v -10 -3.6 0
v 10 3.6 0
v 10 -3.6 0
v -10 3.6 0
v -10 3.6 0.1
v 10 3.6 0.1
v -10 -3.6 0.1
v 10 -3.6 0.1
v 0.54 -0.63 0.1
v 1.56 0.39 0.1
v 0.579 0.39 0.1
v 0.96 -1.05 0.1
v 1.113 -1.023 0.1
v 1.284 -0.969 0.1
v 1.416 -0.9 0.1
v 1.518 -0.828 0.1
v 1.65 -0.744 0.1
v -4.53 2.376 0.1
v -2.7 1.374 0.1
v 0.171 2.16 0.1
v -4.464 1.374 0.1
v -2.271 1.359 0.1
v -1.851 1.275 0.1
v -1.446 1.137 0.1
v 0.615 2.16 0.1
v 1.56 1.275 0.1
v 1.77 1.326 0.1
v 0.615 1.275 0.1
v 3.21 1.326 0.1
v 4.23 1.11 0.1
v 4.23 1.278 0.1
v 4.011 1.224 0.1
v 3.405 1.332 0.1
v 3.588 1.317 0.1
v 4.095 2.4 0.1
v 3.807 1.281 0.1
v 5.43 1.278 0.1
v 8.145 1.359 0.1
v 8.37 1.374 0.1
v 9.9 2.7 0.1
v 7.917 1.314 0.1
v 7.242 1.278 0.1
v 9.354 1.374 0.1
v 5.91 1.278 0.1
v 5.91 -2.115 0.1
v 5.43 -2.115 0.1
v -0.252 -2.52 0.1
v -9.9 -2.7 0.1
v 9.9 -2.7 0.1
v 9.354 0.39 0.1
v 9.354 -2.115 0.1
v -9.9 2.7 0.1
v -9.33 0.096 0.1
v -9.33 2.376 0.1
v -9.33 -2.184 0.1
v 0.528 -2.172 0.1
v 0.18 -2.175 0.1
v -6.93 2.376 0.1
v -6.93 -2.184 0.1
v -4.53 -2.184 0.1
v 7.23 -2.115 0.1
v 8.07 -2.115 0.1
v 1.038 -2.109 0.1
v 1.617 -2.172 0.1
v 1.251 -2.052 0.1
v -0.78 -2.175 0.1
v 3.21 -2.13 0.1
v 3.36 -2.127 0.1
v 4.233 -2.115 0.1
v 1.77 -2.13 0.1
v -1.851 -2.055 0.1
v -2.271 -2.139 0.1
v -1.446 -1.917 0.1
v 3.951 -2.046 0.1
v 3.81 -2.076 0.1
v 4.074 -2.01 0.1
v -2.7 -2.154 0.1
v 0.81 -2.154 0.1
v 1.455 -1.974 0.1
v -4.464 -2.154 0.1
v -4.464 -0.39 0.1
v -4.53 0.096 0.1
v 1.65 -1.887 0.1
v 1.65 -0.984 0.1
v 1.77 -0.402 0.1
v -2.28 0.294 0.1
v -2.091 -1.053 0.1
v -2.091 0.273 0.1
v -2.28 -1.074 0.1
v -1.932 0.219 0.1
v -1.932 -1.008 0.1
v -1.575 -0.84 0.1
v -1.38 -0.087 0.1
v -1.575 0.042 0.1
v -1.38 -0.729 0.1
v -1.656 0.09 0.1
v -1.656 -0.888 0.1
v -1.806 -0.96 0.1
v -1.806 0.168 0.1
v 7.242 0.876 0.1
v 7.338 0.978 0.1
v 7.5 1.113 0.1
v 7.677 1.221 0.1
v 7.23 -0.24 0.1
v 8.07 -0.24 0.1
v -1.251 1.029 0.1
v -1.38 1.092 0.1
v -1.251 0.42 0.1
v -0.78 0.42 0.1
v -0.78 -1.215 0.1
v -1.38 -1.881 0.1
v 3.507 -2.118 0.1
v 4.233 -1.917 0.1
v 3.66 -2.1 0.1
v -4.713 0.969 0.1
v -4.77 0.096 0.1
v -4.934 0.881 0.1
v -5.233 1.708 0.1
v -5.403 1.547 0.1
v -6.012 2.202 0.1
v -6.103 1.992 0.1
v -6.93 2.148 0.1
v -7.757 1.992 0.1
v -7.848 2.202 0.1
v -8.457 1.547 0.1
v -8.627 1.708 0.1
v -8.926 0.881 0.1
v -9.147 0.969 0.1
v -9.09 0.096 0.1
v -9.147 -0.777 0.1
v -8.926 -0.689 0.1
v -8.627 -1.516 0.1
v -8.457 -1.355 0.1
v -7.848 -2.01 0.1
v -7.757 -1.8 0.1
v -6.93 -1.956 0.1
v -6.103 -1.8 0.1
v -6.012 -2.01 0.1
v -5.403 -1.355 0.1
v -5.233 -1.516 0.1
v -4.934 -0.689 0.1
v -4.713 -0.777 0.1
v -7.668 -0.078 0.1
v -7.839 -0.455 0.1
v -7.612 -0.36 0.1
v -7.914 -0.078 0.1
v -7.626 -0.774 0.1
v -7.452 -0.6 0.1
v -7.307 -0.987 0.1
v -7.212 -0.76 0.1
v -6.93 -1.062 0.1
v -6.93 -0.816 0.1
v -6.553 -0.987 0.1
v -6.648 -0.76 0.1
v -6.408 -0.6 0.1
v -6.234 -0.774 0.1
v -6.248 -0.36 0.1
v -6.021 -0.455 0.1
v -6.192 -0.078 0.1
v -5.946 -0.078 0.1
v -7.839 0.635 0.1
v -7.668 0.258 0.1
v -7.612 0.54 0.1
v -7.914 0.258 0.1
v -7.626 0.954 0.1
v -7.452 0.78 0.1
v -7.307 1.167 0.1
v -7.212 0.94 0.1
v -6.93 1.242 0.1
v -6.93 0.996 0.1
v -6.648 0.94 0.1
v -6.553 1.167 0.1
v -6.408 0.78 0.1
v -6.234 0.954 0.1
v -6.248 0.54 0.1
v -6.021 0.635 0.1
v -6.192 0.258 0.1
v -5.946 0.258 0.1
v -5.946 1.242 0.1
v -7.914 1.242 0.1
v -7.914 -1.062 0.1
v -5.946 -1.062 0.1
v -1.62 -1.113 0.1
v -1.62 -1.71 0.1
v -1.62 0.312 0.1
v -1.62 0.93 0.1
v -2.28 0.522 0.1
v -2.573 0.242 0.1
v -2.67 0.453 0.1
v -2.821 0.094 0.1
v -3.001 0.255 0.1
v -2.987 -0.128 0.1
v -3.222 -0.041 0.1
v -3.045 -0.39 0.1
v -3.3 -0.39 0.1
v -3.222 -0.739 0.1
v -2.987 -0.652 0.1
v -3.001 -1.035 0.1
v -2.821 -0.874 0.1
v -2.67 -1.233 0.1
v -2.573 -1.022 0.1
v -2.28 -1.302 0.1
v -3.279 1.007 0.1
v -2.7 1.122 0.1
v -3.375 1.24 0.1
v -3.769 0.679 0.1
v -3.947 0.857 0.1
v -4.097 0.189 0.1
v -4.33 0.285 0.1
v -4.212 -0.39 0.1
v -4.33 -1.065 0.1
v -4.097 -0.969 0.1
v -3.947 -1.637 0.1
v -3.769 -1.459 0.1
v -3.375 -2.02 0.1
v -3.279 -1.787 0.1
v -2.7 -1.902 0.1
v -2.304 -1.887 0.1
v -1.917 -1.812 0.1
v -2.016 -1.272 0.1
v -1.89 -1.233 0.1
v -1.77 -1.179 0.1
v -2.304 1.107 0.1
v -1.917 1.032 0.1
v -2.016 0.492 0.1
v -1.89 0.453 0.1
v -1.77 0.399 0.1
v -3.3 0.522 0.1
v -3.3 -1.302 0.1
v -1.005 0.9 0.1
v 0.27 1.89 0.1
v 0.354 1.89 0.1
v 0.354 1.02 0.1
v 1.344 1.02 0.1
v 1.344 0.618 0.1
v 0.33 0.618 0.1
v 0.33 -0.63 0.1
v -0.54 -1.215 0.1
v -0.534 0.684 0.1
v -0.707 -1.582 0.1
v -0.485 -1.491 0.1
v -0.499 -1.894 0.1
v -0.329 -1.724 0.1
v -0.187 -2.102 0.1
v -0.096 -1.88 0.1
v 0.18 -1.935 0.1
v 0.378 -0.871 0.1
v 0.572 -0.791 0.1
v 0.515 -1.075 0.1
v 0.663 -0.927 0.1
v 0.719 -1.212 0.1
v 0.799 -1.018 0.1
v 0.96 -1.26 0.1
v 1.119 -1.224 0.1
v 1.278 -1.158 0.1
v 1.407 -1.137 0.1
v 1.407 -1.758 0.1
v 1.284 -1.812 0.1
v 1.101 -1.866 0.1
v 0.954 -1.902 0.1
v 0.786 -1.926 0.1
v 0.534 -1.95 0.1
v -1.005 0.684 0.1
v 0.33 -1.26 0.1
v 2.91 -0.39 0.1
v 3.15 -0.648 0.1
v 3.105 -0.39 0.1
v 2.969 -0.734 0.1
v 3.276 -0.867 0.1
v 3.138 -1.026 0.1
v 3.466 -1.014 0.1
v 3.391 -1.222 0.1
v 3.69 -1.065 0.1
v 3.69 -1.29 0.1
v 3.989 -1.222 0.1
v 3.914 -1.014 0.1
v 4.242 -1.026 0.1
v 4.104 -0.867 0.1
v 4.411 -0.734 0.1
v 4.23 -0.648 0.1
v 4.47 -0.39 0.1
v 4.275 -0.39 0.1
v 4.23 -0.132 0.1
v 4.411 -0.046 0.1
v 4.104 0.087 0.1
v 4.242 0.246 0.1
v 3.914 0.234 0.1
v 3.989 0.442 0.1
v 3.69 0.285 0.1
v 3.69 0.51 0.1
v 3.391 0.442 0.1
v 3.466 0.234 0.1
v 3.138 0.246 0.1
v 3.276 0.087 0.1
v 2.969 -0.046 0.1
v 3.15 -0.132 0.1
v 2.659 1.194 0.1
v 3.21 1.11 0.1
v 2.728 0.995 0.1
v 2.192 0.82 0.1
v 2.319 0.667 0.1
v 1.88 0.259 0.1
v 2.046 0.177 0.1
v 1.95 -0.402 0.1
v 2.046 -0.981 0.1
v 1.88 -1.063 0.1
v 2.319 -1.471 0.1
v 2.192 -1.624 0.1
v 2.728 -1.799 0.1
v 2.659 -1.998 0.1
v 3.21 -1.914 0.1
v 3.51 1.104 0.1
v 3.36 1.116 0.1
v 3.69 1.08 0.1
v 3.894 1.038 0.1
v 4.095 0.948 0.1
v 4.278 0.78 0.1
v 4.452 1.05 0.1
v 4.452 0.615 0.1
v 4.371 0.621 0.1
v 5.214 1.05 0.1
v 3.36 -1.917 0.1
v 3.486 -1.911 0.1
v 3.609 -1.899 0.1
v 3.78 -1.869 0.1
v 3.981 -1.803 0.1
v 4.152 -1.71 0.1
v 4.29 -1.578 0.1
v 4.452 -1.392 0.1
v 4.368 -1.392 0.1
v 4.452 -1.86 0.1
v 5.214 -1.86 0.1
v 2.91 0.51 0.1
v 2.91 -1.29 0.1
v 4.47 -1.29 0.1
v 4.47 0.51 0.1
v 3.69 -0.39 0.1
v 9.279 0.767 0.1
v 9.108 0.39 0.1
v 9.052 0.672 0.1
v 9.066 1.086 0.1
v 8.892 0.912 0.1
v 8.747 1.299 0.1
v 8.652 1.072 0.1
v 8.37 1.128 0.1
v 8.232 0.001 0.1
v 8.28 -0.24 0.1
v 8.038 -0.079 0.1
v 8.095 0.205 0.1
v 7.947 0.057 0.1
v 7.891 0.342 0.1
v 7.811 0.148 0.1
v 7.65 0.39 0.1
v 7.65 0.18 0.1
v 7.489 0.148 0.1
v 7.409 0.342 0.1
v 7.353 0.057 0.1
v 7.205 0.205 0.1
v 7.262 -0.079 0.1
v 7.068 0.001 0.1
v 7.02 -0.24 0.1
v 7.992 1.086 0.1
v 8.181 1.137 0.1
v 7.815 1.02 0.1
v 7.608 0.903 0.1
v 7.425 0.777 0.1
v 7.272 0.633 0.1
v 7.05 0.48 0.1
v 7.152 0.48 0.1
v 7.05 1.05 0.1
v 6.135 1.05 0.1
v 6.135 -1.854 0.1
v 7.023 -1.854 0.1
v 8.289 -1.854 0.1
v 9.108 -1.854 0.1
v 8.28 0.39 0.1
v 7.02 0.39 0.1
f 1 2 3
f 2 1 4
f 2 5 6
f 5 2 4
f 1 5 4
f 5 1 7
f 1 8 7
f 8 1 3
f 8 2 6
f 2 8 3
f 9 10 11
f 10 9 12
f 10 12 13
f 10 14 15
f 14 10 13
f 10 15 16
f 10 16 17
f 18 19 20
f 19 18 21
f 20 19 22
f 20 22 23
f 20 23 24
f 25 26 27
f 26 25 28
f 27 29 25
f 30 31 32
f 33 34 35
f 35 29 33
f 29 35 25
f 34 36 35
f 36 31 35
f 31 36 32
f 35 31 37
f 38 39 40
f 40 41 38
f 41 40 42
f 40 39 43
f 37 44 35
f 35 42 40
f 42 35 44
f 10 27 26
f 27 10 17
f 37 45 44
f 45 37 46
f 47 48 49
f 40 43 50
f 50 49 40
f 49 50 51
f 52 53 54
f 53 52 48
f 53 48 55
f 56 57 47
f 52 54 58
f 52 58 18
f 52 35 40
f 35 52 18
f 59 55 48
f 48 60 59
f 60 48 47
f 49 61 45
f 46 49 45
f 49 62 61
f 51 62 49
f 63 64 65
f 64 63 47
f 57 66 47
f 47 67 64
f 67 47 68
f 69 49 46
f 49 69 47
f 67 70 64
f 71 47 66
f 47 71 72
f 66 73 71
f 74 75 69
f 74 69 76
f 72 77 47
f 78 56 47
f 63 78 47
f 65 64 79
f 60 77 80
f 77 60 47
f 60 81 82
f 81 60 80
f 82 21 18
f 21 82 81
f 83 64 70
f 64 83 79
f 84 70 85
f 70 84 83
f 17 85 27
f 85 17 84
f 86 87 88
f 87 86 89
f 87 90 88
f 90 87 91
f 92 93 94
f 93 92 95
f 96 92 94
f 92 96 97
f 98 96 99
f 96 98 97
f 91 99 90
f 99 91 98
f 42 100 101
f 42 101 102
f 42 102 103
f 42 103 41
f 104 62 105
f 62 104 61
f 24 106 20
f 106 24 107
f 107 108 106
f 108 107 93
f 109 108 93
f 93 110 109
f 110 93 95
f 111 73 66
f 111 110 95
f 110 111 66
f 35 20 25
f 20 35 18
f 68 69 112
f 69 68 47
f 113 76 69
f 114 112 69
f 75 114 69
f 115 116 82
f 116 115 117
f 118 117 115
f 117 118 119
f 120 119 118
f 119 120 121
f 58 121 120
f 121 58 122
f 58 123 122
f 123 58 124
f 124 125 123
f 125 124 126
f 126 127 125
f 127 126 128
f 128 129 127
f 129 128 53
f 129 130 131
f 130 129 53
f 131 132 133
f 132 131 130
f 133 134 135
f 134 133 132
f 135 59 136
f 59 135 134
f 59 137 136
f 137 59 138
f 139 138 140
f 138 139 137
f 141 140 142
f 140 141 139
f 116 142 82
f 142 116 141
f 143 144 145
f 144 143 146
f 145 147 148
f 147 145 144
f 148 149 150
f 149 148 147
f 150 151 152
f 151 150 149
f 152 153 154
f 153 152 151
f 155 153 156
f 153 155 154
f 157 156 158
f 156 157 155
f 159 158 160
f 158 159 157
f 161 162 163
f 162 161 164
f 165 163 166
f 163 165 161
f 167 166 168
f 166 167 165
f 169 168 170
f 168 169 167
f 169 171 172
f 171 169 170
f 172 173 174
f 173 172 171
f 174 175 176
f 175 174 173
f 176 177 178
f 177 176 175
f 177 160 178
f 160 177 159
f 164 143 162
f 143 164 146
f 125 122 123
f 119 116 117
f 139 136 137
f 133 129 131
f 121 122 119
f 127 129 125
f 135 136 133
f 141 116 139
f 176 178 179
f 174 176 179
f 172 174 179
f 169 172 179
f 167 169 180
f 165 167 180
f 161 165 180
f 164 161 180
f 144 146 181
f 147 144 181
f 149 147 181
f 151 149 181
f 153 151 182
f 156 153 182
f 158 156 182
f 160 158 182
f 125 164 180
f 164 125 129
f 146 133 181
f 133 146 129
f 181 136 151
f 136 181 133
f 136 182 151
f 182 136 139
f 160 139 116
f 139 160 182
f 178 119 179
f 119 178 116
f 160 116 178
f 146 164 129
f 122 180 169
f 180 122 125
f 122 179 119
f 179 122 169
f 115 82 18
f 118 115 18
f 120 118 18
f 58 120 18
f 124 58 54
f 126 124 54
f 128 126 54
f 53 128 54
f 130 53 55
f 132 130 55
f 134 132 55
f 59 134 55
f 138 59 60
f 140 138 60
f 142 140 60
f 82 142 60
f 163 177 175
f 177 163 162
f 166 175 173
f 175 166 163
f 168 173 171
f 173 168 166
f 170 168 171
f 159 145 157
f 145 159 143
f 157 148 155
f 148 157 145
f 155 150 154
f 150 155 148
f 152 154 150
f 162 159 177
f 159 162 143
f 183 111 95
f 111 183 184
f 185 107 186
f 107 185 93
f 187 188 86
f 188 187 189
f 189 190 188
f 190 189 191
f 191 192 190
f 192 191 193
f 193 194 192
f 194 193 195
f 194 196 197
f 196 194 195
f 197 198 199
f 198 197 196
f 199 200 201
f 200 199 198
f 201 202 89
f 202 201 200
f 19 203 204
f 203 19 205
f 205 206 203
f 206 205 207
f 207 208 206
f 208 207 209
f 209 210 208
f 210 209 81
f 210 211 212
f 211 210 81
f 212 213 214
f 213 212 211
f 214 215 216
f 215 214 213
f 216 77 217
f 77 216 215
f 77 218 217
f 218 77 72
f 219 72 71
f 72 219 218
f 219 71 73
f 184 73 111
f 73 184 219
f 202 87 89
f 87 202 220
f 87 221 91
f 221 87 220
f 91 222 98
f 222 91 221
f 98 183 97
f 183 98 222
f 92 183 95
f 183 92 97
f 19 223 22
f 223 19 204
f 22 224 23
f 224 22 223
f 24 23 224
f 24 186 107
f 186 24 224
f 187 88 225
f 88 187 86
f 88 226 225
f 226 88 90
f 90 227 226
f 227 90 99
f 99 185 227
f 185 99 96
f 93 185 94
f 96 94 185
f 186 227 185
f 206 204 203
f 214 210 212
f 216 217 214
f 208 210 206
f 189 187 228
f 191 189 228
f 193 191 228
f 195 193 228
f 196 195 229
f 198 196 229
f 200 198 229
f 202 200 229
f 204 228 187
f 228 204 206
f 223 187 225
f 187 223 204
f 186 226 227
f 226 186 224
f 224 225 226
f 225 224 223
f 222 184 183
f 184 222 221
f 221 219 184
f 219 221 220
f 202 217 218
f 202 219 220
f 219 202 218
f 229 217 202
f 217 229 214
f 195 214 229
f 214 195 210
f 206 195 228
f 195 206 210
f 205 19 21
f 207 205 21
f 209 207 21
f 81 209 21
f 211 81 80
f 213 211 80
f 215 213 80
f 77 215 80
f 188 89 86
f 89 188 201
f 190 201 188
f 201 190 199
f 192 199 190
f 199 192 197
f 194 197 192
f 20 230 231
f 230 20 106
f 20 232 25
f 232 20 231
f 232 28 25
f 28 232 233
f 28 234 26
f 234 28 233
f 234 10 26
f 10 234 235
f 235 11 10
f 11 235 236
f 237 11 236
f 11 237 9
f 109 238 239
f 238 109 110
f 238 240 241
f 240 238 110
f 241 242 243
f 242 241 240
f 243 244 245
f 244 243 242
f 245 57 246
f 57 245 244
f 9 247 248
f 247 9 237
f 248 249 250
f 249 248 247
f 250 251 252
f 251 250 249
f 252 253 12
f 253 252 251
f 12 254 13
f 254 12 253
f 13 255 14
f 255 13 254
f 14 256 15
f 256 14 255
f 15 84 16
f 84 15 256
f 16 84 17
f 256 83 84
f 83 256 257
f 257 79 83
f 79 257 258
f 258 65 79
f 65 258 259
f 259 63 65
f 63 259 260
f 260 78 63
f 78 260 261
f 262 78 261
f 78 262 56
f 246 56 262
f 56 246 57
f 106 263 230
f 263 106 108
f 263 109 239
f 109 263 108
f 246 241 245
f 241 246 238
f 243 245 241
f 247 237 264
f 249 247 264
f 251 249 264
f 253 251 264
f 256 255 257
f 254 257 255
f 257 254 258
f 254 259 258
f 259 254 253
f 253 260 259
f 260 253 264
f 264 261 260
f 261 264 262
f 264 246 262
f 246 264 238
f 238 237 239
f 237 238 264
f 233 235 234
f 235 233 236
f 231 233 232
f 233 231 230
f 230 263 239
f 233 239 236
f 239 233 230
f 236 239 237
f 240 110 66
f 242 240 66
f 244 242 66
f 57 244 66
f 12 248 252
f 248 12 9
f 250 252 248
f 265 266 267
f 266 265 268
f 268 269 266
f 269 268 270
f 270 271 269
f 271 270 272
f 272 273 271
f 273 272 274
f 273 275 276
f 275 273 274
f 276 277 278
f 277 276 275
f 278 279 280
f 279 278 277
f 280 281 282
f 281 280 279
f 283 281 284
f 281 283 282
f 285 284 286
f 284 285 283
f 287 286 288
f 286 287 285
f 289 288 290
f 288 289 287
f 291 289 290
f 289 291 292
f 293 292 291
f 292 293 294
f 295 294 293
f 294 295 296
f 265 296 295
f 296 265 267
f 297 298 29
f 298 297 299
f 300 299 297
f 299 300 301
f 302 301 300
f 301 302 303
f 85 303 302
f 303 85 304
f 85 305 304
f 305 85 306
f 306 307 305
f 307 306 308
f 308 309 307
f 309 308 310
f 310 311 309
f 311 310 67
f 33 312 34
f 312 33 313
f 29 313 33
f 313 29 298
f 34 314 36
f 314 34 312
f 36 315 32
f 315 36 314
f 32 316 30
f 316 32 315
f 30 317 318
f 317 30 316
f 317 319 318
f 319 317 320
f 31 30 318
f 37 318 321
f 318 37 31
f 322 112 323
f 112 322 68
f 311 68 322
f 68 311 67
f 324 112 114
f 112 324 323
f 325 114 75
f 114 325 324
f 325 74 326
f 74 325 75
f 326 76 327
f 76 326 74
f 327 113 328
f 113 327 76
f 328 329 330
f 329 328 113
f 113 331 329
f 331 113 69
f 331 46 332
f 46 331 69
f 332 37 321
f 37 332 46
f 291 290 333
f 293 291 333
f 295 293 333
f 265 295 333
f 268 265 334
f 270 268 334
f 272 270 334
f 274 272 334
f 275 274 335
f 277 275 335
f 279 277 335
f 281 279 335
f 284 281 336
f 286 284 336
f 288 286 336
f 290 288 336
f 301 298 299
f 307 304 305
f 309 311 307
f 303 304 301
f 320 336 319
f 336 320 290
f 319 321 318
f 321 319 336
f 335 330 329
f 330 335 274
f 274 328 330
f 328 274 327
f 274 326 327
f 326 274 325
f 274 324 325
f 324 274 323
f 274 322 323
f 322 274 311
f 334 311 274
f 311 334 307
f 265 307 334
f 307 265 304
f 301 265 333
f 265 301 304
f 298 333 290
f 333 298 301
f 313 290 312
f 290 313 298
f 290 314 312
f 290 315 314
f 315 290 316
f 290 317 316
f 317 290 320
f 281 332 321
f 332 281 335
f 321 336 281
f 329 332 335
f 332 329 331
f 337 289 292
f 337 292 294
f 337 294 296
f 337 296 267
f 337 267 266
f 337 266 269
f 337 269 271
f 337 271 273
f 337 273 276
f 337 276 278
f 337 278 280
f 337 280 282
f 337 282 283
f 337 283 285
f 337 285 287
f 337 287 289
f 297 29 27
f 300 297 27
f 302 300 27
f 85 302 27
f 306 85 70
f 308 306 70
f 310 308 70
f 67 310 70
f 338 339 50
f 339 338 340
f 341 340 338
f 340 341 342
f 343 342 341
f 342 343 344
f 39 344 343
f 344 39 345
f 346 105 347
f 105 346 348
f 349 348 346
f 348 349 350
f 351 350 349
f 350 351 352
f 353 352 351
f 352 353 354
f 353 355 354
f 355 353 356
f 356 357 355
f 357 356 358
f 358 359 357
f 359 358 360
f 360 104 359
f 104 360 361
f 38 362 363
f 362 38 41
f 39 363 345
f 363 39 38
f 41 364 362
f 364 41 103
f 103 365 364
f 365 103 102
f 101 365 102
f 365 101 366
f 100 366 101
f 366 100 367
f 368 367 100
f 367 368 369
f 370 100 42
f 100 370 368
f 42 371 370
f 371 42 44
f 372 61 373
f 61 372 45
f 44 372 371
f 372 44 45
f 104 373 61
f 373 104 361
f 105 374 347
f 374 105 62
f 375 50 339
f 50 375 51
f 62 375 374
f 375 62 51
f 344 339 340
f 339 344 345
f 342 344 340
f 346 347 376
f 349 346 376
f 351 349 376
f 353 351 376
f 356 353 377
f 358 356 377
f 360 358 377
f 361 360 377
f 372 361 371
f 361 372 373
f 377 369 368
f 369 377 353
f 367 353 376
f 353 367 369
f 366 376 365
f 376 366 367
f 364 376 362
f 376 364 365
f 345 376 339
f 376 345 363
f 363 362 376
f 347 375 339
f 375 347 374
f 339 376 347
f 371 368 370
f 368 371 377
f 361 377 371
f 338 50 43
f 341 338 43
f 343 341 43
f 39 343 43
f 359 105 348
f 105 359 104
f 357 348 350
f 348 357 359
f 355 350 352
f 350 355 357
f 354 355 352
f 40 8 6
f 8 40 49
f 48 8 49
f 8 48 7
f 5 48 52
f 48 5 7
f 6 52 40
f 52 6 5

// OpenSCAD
use <../lib.scad>
use <../p/box5-12.scad>
use <../p/logo-octantext.scad>
function ldraw_lib__821430c() = [
// 0 Sticker  0.9 x  2.5 with Red and Green "Octan" Logo with Black Border
// 0 Name: 821430c.dat
// 0 Author: Gerald Lasser [GeraldLasser]
// 0 !LDRAW_ORG Part UPDATE 2022-06
// 0 !LICENSE Licensed under CC BY 2.0 and CC BY 4.0 : see CAreadme.txt
// 
// 0 BFC CERTIFY CCW
  [0,"BFC","CERTIFY"],
  [0,"BFC","CCW"],
// 
// 0 !KEYWORDS Set 4537
// 
// 0 !HISTORY 2022-12-20 [PTadmin] Official Update 2022-06
// 
// 
// 1 16 0 -.25 0 25 0 0 0 .25 0 0 0 9 box5-12.dat
  [1,16,0,-.25,0,25,0,0,0,.25,0,0,0,9, ldraw_lib__box5_12()],
// 1 16 0 -.25 0 0.75 0 0 0 1 0 0 0 0.75 logo-octantext.dat
  [1,16,0,-.25,0,0.75,0,0,0,1,0,0,0,0.75, ldraw_lib__logo_octantext()],
// 4 16 25 -.25 9 24.75 -.25 6.75 24.75 -.25 -6.75 25 -.25 -9
  [4,16,25,-.25,9,24.75,-.25,6.75,24.75,-.25,-6.75,25,-.25,-9],
// 4 16 25 -.25 -9 24.75 -.25 -6.75 -24.75 -.25 -6.75 -25 -.25 -9
  [4,16,25,-.25,-9,24.75,-.25,-6.75,-24.75,-.25,-6.75,-25,-.25,-9],
// 4 16 -25 -.25 -9 -24.75 -.25 -6.75 -24.75 -.25 6.75 -25 -.25 9
  [4,16,-25,-.25,-9,-24.75,-.25,-6.75,-24.75,-.25,6.75,-25,-.25,9],
// 4 16 -25 -.25 9 -24.75 -.25 6.75 24.75 -.25 6.75 25 -.25 9
  [4,16,-25,-.25,9,-24.75,-.25,6.75,24.75,-.25,6.75,25,-.25,9],
];
makepoly(ldraw_lib__821430c(), line=0.2);
